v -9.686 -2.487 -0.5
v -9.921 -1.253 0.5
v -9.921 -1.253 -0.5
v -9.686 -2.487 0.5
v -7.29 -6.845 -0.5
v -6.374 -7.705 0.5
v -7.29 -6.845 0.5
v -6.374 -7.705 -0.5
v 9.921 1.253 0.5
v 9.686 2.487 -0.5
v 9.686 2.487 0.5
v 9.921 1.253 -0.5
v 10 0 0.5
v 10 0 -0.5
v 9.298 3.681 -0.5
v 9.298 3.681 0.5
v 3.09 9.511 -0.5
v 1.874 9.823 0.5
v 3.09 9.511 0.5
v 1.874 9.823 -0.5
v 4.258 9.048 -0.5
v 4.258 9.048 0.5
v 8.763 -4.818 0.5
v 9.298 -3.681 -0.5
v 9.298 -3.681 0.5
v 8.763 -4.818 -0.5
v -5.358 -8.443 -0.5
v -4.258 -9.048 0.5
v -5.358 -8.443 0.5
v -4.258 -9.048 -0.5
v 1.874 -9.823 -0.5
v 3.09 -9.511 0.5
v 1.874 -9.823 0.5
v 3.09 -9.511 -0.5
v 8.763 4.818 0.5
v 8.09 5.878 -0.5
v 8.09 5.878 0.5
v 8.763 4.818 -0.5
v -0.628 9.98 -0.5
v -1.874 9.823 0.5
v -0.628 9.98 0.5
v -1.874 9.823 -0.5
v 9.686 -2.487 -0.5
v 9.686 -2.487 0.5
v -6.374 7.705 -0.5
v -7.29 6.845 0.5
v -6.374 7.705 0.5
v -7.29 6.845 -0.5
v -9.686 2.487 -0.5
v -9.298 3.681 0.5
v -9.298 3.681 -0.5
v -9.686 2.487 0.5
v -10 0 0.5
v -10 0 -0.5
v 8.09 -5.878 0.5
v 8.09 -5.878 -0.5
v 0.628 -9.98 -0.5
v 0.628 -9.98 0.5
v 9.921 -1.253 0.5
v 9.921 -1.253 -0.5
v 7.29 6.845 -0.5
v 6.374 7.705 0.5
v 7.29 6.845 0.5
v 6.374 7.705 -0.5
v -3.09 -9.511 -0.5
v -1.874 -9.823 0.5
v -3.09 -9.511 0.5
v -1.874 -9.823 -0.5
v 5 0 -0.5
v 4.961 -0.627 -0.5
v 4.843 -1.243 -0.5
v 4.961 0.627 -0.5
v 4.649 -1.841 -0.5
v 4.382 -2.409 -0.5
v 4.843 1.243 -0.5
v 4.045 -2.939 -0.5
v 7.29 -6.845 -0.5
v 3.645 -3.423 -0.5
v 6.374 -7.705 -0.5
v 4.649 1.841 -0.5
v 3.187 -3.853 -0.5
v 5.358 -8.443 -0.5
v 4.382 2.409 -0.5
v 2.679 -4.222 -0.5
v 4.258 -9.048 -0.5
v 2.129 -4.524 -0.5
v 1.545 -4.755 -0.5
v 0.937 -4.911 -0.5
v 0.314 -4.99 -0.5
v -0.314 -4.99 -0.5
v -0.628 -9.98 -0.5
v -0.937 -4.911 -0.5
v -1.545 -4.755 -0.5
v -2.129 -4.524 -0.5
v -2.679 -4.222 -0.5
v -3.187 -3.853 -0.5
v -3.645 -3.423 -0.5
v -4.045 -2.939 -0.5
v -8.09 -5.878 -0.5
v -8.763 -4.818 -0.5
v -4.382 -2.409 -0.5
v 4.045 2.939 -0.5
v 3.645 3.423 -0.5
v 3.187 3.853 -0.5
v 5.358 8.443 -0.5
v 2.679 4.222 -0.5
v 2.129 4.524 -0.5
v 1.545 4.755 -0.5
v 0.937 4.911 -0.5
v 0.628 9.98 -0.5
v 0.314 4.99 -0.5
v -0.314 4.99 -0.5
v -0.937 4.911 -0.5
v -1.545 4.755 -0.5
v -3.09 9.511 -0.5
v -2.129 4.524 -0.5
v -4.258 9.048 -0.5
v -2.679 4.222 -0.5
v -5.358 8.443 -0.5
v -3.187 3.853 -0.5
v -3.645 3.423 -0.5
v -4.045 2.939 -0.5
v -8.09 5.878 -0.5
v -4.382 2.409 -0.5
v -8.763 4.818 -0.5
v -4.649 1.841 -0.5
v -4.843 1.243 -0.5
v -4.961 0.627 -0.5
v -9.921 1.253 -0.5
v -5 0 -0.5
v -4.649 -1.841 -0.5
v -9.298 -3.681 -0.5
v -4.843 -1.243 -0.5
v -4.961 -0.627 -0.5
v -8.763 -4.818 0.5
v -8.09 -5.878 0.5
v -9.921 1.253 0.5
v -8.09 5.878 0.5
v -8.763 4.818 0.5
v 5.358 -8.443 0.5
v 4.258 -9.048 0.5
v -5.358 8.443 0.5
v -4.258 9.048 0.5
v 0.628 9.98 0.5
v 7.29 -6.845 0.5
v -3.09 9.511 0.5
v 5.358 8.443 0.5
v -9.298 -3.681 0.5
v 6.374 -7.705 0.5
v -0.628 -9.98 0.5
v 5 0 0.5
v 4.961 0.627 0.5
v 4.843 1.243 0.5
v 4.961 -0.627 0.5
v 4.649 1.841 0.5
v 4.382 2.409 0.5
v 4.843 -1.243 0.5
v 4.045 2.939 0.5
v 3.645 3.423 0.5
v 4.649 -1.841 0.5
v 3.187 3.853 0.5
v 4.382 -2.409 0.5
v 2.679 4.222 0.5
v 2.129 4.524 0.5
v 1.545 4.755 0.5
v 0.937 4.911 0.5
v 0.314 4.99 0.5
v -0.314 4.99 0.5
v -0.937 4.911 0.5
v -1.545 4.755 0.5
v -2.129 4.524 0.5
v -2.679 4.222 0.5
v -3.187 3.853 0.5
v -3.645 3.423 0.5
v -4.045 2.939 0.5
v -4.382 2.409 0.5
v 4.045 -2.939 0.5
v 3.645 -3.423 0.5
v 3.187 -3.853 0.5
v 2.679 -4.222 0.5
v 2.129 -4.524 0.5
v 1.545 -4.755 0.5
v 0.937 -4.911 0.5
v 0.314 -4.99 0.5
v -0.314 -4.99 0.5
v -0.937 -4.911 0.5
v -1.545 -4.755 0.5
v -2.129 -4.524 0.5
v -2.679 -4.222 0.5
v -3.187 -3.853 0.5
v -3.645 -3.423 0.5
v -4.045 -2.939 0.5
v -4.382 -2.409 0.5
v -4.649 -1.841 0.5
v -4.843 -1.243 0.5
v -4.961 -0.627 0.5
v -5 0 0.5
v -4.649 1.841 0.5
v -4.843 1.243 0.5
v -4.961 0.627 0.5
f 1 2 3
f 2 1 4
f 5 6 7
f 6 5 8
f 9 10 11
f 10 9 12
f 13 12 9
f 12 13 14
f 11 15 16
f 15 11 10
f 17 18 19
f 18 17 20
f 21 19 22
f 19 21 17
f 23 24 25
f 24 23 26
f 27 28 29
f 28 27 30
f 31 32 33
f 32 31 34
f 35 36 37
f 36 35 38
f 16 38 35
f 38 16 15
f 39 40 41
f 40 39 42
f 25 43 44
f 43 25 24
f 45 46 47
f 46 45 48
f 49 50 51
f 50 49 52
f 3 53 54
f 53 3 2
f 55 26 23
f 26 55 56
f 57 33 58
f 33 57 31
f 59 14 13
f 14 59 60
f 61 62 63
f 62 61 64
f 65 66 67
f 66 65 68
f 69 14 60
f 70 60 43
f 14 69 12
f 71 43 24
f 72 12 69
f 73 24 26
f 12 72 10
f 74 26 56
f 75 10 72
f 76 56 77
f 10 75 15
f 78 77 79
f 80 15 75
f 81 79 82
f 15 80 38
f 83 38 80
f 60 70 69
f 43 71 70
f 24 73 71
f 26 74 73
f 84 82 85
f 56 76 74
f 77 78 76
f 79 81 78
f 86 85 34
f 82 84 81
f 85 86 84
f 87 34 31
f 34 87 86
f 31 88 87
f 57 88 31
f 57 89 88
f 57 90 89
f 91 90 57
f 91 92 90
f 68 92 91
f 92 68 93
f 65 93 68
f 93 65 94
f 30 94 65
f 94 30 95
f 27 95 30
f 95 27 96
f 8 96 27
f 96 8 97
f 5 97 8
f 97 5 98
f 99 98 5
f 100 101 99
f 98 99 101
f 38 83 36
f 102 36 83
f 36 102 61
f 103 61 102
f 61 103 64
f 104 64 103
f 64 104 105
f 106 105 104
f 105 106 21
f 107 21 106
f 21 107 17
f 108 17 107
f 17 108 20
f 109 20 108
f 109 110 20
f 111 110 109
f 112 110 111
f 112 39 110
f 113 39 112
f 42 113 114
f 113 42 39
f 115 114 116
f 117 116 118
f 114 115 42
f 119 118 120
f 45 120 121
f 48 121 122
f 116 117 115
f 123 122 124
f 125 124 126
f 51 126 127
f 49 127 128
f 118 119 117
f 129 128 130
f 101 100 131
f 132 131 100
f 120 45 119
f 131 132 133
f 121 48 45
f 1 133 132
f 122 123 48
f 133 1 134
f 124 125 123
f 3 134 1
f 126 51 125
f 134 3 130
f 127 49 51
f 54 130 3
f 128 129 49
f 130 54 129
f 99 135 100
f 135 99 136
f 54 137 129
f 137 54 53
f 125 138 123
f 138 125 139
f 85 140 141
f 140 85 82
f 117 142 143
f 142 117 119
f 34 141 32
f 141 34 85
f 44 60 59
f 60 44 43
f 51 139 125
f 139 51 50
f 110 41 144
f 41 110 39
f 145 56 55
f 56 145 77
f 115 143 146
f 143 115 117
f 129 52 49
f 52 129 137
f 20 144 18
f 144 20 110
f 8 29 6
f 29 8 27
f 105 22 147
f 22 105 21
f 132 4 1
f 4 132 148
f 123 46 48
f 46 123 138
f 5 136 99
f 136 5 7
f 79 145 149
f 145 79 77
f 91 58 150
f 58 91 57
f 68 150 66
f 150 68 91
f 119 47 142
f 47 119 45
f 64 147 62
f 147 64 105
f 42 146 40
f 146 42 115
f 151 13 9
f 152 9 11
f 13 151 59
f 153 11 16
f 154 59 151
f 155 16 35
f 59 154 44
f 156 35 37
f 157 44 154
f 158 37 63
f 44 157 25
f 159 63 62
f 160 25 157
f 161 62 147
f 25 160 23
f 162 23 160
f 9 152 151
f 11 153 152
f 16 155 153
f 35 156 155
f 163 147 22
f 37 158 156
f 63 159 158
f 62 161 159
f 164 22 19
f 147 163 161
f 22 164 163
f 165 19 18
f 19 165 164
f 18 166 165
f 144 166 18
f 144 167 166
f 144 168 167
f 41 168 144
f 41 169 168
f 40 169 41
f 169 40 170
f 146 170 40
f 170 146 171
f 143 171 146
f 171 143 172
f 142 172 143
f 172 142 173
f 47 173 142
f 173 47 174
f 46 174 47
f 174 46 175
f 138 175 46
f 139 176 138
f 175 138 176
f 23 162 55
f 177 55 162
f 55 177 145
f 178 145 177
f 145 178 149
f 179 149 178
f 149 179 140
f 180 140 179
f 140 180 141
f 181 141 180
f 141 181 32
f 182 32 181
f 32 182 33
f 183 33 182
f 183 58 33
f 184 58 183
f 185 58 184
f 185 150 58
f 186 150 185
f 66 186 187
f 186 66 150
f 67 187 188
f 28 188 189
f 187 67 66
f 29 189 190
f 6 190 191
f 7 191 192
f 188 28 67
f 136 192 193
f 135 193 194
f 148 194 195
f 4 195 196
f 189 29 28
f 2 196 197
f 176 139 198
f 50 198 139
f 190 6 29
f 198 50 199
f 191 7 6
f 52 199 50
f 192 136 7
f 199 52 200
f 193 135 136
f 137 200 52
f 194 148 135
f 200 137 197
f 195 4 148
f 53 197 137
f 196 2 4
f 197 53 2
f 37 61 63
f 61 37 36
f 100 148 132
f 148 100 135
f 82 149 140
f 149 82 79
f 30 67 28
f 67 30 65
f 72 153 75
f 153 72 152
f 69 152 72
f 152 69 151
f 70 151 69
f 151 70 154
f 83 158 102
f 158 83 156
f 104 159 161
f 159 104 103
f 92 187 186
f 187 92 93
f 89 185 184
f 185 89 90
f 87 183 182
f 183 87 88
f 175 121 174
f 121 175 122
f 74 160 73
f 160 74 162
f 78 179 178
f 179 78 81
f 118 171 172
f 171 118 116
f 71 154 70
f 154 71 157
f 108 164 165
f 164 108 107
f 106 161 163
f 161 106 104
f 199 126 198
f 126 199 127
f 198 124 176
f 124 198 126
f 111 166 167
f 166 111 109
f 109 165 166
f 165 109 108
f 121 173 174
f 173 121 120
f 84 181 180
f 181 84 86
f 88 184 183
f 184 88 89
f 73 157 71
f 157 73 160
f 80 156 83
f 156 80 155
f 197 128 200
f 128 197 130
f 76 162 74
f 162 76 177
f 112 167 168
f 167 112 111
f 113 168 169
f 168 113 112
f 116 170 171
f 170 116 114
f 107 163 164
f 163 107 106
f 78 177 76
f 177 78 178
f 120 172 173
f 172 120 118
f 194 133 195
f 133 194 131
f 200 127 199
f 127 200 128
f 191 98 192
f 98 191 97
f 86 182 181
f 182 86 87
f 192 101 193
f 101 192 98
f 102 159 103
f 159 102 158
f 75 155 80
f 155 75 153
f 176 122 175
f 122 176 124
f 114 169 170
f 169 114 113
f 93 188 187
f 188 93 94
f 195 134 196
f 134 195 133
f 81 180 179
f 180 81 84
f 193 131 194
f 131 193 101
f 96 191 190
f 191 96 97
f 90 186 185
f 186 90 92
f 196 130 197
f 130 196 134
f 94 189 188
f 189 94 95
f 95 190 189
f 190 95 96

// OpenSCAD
$fn = 50;


difference() {
	union() {
		translate(v = [0, 0, -0.5000000000]) {
			cylinder(h = 1, r = 10.0000000000);
		}
	}
	union() {
		translate(v = [0, 0, -100.0000000000]) {
			cylinder(h = 200, r = 5.0000000000);
		}
	}
}
